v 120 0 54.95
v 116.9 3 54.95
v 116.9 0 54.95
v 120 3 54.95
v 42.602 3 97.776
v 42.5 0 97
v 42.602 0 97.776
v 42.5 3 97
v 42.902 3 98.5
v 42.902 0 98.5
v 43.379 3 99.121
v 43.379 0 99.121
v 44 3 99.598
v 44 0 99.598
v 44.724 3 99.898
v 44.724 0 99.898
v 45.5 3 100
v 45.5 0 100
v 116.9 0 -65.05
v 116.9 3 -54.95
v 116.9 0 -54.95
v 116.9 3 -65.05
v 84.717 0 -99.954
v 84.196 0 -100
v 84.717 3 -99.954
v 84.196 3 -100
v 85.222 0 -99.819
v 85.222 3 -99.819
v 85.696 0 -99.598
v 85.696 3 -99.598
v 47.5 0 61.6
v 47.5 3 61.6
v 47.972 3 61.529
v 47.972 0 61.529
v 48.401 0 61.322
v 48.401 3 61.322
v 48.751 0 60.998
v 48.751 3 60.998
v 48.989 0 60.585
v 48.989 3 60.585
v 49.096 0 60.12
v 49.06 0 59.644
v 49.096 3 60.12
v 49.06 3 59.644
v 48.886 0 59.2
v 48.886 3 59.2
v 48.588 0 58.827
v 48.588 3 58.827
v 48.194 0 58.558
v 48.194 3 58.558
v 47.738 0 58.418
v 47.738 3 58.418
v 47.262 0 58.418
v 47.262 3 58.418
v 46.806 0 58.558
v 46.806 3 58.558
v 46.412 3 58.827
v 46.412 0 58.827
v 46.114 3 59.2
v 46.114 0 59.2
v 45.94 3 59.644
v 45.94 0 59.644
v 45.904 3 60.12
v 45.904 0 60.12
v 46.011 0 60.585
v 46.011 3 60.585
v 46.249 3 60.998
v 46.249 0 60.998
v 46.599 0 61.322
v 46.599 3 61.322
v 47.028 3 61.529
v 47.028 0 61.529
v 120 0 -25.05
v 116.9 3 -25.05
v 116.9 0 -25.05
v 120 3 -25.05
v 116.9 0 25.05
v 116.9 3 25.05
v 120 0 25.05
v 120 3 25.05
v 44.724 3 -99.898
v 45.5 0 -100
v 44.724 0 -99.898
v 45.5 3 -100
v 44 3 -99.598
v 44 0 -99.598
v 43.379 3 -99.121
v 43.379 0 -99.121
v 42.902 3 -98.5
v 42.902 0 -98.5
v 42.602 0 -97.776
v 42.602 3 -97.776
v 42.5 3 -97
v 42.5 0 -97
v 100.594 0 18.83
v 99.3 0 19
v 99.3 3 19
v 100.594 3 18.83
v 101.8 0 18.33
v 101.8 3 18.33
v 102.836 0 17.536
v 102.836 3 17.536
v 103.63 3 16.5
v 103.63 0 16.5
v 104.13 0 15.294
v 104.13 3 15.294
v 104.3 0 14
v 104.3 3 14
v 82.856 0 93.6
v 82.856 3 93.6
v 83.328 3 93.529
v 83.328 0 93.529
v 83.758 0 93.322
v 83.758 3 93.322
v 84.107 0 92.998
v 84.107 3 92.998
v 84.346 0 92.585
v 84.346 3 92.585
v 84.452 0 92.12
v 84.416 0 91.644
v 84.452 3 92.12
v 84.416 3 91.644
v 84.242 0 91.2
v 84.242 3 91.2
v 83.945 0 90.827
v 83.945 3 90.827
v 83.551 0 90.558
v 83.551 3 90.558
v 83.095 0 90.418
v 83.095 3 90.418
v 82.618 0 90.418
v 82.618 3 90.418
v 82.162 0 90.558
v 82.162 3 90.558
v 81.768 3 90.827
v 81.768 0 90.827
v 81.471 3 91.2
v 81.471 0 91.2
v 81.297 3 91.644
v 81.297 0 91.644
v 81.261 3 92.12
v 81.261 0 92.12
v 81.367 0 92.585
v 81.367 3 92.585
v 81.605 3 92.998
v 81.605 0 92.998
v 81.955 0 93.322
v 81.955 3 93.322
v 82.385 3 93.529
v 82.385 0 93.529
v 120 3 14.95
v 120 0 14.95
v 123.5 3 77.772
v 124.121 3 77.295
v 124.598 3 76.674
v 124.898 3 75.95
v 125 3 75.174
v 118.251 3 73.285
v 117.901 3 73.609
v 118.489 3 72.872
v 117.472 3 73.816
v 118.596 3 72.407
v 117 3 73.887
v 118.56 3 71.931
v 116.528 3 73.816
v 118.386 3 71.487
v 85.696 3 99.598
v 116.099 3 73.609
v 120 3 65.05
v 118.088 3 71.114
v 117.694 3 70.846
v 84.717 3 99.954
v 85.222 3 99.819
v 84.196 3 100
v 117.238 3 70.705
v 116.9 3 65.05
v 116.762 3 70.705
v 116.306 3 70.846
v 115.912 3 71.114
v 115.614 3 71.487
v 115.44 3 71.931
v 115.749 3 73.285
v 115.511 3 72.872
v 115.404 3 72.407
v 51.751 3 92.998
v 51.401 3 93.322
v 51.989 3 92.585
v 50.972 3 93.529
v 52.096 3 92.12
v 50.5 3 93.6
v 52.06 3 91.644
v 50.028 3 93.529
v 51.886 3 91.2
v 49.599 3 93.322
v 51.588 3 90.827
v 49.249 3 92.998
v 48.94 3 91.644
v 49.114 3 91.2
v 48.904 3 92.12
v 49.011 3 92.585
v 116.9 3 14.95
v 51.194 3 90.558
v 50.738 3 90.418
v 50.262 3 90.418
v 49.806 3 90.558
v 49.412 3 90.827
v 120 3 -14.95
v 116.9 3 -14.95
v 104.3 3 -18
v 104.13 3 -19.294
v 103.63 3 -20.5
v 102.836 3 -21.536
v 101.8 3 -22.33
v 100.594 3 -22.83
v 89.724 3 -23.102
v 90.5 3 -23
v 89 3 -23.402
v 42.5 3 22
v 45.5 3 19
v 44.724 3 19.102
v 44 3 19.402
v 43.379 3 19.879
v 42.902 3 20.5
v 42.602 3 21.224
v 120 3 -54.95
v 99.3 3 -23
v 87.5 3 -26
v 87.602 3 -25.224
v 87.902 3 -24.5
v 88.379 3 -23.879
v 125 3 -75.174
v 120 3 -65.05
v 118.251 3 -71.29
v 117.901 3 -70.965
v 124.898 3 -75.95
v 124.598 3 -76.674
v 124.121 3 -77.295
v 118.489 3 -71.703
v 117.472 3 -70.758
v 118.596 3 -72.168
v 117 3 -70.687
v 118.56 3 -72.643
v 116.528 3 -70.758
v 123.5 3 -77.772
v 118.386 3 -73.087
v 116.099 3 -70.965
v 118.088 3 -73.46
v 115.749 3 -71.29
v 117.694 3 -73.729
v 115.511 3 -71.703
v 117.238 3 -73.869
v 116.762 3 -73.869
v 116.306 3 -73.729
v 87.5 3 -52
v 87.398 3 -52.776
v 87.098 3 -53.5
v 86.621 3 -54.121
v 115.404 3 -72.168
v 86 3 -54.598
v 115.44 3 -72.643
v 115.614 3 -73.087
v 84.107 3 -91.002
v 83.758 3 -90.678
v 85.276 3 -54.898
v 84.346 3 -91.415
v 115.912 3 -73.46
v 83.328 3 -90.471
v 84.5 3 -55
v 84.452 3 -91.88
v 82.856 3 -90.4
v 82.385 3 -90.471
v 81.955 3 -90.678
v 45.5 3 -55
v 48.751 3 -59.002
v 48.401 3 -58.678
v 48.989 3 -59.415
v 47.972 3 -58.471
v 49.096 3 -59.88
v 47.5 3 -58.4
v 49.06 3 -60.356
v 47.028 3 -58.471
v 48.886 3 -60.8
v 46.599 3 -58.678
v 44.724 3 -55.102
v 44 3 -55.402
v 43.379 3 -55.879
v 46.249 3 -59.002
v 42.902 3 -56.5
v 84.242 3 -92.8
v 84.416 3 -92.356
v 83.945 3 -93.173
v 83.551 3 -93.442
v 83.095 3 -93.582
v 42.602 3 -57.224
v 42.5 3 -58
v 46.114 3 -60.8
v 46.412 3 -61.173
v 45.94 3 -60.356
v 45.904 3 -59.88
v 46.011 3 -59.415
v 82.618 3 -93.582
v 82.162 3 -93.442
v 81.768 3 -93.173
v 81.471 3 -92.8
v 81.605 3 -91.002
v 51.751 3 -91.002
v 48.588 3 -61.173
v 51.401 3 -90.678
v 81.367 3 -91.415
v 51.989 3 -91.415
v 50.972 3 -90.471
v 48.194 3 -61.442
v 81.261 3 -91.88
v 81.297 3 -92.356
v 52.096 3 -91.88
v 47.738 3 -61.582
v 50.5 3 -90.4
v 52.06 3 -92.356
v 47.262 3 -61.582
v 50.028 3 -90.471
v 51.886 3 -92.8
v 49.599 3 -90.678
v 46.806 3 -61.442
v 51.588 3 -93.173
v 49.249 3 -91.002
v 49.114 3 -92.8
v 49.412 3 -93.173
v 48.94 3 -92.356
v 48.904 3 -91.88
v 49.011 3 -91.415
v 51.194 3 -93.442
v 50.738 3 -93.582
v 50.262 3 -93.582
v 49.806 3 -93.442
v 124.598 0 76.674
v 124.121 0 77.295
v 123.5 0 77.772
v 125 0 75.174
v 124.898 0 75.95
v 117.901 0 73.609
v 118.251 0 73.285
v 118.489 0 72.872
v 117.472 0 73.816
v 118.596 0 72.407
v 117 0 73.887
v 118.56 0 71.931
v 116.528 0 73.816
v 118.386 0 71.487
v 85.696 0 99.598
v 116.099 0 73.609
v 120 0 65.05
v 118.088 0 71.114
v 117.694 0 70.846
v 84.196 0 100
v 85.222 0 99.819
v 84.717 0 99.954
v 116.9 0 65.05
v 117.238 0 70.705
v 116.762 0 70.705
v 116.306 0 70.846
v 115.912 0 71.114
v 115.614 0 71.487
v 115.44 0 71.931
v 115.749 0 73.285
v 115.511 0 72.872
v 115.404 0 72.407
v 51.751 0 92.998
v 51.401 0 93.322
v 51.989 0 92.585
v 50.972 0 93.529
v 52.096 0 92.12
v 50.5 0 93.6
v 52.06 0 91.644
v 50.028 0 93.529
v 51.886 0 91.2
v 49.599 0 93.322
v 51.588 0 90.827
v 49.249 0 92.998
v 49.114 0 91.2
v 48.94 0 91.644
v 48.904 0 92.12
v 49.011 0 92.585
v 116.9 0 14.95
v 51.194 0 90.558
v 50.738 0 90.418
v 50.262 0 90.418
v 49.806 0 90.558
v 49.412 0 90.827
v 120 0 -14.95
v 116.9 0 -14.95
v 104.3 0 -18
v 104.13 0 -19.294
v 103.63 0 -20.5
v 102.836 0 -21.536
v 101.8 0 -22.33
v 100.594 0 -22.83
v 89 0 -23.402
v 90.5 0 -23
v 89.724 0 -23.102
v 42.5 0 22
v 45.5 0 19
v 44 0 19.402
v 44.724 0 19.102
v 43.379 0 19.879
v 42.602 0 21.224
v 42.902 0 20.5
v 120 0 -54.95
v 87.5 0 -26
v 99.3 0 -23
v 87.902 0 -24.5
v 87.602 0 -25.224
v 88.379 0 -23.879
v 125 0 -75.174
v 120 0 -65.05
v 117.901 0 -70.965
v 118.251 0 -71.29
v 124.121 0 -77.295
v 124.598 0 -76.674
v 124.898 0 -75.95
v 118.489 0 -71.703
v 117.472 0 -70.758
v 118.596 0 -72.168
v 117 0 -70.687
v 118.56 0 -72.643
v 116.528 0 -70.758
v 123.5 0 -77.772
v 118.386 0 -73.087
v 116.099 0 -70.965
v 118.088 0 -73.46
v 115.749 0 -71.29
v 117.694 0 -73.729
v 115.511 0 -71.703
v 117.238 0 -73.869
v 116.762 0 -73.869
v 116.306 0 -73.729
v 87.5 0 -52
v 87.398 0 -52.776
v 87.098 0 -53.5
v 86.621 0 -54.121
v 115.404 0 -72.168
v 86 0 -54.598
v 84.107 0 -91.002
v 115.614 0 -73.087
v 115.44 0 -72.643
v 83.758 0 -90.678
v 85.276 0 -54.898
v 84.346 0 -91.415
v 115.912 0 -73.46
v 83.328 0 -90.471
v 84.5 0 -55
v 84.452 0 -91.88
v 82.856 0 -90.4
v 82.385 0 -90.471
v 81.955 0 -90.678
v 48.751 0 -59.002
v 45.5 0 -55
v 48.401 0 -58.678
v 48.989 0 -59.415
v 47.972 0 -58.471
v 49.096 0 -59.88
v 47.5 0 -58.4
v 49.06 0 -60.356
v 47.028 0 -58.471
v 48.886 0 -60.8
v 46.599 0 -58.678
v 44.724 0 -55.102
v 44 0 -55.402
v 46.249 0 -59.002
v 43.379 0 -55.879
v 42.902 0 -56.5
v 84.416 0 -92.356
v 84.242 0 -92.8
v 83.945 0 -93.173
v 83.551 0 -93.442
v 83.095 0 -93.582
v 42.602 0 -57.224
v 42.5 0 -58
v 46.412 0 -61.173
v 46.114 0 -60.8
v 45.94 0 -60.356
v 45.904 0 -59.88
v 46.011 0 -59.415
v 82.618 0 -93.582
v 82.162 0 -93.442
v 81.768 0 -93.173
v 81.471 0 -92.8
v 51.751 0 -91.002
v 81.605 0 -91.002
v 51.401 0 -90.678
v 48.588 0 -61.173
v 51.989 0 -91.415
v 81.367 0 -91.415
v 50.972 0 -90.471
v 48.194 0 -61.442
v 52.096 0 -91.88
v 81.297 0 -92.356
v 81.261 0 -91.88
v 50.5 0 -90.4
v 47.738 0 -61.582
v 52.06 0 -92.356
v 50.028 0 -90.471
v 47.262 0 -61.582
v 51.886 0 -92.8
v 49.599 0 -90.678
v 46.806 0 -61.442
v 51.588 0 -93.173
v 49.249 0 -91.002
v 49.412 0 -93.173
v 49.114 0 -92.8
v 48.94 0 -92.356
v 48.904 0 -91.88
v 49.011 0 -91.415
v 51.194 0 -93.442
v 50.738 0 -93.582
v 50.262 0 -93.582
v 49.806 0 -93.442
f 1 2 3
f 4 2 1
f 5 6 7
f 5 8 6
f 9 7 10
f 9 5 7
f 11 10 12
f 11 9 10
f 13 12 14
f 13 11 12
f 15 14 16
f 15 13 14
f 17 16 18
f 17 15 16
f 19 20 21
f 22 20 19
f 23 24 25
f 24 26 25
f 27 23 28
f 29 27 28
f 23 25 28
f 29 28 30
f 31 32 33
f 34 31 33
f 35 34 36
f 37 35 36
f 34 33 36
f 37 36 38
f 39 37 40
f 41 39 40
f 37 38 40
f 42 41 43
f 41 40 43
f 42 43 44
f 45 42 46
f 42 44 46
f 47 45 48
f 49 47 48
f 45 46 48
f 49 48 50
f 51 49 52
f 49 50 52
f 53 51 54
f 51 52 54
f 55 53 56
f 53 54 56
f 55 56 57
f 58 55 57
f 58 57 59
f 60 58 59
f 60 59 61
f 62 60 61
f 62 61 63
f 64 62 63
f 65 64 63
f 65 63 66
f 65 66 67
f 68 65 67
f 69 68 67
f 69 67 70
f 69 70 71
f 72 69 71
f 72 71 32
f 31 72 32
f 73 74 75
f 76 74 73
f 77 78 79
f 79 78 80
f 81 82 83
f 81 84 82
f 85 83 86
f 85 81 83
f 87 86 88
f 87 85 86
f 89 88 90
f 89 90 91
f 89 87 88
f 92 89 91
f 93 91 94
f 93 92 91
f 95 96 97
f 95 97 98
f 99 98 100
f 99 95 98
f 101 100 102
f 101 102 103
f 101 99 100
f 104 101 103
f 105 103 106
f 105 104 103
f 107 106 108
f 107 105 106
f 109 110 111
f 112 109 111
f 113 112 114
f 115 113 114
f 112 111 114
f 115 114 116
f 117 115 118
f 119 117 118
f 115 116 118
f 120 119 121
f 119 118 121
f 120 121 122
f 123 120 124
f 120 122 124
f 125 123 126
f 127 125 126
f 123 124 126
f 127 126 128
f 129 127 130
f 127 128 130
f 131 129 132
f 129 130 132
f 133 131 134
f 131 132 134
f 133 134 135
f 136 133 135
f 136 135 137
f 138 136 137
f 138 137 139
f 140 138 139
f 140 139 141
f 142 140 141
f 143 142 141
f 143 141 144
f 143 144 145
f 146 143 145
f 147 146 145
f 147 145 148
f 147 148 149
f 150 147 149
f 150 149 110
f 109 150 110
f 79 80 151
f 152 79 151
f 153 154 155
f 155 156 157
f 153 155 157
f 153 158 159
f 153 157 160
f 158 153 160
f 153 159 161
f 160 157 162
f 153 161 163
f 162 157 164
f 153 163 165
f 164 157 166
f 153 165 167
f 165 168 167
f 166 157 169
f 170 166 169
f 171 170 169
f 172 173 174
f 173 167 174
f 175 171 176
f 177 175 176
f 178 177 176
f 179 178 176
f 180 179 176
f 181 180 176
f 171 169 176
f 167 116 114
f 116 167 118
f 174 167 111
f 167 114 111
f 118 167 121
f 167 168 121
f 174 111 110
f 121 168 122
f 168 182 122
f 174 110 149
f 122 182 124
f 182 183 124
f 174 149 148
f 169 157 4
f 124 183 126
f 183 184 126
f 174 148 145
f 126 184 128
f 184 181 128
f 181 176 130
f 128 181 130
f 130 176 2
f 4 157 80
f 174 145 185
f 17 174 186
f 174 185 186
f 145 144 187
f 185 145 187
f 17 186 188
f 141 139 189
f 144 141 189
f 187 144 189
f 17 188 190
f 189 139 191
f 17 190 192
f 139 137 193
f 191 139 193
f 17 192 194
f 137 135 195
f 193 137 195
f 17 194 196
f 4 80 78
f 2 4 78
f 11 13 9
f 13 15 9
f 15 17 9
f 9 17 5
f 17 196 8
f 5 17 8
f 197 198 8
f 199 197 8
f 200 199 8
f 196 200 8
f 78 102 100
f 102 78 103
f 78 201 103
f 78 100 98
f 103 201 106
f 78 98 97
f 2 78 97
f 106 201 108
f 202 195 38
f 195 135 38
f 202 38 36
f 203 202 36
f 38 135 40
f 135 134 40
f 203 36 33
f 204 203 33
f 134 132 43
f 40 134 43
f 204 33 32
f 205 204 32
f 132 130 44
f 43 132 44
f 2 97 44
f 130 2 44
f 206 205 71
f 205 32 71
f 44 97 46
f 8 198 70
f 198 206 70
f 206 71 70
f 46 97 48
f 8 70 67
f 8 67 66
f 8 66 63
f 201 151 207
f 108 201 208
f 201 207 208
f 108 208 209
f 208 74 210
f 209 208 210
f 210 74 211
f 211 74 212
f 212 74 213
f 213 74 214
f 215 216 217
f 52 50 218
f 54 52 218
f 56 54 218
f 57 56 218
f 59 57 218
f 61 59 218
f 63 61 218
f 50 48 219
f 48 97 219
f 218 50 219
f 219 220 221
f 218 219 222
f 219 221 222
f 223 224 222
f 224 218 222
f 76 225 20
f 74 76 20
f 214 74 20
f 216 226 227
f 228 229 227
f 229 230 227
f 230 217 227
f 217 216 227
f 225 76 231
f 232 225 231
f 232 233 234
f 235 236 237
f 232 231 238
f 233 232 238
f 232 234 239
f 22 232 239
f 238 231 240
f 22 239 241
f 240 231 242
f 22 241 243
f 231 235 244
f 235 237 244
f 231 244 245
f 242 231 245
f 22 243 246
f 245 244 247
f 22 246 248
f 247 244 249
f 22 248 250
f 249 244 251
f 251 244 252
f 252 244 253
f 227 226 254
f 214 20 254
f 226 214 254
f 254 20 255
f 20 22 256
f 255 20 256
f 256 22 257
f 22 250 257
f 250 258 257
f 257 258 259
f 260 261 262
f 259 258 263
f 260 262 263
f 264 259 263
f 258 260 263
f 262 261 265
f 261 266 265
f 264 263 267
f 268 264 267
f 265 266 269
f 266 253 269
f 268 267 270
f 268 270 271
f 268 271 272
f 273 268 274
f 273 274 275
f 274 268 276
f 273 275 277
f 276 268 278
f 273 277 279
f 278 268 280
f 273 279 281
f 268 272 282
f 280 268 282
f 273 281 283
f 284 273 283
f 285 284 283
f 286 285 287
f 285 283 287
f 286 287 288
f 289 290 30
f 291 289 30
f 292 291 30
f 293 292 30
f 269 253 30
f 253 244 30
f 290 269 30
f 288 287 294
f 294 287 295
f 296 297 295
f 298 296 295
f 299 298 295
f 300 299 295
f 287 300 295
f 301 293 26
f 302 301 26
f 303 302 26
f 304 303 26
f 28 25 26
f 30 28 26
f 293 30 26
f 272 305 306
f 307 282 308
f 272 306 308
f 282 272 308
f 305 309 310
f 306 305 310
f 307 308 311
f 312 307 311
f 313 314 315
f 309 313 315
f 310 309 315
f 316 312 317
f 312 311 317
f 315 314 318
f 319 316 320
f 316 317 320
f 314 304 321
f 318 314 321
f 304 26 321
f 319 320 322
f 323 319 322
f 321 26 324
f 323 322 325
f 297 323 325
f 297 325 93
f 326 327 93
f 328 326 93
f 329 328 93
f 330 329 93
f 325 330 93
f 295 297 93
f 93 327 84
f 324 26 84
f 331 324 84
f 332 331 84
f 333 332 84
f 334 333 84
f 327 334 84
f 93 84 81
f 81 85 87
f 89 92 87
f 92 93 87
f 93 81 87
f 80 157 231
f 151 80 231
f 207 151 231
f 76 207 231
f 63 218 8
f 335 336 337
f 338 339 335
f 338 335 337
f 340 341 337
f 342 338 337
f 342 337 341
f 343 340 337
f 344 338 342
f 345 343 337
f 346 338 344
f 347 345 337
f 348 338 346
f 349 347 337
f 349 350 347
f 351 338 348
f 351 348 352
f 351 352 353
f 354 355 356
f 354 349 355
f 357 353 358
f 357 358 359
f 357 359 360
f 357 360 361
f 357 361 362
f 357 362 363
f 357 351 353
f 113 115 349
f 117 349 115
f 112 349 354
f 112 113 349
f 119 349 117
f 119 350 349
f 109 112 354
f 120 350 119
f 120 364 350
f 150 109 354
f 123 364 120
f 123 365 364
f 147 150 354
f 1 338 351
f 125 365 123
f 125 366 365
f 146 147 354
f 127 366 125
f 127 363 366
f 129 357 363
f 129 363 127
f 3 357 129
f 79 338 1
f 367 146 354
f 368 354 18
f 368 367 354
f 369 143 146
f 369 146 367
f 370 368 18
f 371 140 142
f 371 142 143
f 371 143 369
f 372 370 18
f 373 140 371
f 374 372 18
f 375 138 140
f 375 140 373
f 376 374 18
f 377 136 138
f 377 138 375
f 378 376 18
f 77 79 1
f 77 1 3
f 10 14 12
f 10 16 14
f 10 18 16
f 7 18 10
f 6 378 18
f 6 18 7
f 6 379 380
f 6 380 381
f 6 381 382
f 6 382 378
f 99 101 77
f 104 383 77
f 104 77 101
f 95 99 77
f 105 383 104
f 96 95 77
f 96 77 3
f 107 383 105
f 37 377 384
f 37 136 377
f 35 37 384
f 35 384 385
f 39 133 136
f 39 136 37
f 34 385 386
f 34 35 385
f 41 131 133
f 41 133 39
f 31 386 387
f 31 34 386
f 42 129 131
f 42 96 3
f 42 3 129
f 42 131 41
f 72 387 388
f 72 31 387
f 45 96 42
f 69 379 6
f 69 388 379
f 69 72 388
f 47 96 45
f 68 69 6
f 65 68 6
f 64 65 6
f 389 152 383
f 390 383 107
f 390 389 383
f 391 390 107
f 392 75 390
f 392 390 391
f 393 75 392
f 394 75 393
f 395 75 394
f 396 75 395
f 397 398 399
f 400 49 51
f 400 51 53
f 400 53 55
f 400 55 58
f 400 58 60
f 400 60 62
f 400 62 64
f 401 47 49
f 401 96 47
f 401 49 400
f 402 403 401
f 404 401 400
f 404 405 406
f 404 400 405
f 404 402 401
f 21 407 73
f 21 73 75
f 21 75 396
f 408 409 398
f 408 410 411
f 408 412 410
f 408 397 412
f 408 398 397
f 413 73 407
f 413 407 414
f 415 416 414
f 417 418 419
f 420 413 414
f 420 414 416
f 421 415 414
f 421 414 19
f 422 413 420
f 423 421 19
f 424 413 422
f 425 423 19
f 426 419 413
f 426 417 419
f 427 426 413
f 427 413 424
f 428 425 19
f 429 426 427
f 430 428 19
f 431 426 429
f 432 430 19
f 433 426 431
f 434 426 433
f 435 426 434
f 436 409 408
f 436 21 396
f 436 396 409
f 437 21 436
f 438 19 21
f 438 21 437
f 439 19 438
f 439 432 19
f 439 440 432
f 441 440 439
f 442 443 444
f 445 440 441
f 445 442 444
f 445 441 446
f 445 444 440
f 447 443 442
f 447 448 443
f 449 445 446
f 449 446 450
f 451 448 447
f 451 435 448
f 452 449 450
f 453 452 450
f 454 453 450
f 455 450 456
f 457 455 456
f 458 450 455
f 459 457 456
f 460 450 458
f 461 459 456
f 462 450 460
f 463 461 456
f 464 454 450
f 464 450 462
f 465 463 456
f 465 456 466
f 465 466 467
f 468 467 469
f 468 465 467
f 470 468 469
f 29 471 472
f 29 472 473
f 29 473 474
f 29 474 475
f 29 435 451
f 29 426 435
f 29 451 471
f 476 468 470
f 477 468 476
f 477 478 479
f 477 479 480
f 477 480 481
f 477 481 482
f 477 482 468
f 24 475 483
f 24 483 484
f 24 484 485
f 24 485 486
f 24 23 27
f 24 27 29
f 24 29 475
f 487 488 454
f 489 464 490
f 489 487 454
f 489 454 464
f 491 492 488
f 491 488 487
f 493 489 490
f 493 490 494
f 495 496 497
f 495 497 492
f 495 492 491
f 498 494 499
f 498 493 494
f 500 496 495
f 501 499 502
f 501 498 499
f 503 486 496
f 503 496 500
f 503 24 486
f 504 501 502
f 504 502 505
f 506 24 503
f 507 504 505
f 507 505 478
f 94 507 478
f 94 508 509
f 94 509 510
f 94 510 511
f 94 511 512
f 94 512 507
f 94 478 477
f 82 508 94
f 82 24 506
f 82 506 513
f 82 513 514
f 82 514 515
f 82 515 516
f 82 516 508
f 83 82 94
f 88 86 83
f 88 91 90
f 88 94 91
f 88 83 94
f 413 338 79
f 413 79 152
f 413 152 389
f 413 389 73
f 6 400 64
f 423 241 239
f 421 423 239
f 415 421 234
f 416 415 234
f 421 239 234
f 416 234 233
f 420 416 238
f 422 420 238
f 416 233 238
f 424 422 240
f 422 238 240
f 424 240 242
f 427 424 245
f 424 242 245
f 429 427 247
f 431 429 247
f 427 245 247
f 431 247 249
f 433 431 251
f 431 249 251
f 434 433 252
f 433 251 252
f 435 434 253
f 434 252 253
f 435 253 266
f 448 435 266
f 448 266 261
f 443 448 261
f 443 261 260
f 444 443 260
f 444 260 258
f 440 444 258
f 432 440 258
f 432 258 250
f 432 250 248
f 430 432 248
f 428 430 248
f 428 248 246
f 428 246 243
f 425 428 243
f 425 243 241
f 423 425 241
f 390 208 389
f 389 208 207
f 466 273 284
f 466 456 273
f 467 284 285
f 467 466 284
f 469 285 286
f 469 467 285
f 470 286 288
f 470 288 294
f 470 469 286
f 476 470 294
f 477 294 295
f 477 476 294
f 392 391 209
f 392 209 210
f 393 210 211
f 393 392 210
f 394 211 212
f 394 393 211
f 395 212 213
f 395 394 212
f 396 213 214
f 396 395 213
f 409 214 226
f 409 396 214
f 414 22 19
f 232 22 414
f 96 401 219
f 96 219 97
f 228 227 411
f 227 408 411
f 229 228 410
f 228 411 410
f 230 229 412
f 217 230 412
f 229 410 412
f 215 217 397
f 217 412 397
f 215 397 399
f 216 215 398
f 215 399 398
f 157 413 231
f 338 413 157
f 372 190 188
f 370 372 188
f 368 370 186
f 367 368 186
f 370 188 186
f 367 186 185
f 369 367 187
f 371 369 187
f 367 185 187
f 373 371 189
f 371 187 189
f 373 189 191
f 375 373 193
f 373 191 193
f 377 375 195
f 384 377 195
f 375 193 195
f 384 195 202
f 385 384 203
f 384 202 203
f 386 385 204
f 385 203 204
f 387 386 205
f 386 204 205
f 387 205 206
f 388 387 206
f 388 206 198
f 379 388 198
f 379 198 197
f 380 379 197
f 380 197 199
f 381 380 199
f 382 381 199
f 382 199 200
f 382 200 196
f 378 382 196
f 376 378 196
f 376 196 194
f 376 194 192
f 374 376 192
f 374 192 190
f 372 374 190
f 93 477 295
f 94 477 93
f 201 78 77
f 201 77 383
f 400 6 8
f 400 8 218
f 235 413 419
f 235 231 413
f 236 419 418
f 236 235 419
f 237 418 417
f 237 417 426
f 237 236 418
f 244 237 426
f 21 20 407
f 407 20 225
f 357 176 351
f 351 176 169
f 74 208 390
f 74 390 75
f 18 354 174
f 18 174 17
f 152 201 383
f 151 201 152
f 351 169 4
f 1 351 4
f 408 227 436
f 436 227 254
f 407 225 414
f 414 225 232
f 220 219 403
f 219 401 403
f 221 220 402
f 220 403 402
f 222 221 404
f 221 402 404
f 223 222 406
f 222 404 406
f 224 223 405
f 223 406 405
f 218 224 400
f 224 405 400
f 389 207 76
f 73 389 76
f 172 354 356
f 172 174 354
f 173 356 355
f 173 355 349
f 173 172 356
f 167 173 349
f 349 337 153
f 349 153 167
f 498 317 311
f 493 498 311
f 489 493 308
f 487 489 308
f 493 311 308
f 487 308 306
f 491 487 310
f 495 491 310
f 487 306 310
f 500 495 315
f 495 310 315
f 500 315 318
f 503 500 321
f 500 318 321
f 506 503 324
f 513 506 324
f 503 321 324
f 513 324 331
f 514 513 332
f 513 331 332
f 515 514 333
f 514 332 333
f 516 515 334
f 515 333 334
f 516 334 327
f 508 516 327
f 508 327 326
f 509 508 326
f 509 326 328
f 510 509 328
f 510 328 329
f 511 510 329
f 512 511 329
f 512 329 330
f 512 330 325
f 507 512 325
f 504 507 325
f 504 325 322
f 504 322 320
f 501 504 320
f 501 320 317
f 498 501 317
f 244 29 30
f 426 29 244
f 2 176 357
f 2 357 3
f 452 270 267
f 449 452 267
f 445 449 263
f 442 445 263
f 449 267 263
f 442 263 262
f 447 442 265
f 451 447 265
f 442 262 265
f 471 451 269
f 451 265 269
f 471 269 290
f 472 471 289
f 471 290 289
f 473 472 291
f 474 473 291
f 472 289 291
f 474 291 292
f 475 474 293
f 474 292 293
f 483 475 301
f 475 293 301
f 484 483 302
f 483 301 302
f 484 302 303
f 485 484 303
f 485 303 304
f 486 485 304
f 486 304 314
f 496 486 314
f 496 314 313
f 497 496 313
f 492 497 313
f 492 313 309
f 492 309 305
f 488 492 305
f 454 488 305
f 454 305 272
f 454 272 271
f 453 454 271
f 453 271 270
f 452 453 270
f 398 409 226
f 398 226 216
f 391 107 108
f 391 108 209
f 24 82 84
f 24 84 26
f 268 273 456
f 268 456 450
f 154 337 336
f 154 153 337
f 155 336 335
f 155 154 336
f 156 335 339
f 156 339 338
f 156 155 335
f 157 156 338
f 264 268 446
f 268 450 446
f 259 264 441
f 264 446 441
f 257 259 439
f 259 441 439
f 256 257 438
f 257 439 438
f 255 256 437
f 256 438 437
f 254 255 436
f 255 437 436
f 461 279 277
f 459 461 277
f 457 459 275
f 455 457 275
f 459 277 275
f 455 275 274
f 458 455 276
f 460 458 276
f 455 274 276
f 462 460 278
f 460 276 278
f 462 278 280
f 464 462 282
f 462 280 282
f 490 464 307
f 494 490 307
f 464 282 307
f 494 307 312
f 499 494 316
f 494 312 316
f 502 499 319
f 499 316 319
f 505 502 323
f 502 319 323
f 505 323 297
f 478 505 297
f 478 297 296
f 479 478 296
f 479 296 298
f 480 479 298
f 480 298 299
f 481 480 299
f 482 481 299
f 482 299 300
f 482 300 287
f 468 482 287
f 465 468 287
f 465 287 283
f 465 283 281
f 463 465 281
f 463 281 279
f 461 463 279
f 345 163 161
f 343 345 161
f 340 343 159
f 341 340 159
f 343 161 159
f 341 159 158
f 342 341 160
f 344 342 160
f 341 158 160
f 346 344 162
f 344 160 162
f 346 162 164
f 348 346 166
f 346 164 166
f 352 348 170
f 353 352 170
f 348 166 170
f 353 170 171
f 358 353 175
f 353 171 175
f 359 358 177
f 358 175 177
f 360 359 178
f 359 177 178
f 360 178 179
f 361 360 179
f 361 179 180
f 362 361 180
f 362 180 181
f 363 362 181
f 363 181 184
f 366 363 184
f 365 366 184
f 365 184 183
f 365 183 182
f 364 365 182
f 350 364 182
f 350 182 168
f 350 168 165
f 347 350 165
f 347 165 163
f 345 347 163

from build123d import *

# Parameters (mm, degrees)
BOSS_EXTRUDE1_DEPTH = 3
CUT_EXTRUDE1_REACH  = 162.106
SKETCH2_W           = 45
SKETCH2_H           = 74
FILLET2_R           = 3
SKETCH3_W           = 3.1
SKETCH3_H           = 10.1
CUT_EXTRUDE2_DEPTH  = 161.106214745
CUT_EXTRUDE3_REACH  = 162.106
SKETCH4_R           = 1.6


with BuildPart() as part:
    # Sketch1 → Boss-Extrude1 (new body)
    with BuildSketch(Plane(origin=(0, 0, 0), x_dir=(1, 0, 0), z_dir=(0, 1, 0))):
        Polygon((42.5, 100), (85, 100), (125, 76.905989232), (125, -76.905989232), (85, -100), (42.5, -100), align=None)
        with BuildLine():
            Line((99.3, 23), (67.3, 23))
            ThreePointArc((67.3, 23), (63.764466094, 21.535533906), (62.3, 18))
            Line((62.3, 18), (62.3, -14))
            ThreePointArc((62.3, -14), (63.764466094, -17.535533906), (67.3, -19))
            Line((67.3, -19), (99.3, -19))
            ThreePointArc((99.3, -19), (102.835533906, -17.535533906), (104.3, -14))
            Line((104.3, -14), (104.3, 18))
            ThreePointArc((104.3, 18), (102.835533906, 21.535533906), (99.3, 23))
        make_face(mode=Mode.SUBTRACT)
    extrude(amount=BOSS_EXTRUDE1_DEPTH)

    # Sketch2 → Cut-Extrude1 (cut, up to next)
    with BuildSketch(Plane(origin=(0, 3, 0), x_dir=(1, 0, 0), z_dir=(0, 1, 0)), mode=Mode.PRIVATE) as cut_extrude1_sk1:
        with Locations((65, 18)):
            Rectangle(SKETCH2_W, SKETCH2_H)
    cut_extrude1_tool1 = extrude(cut_extrude1_sk1.sketch, amount=-CUT_EXTRUDE1_REACH, mode=Mode.PRIVATE) & part.part
    add(cut_extrude1_tool1.solids().sort_by_distance((65, 3, -18))[0], mode=Mode.SUBTRACT)

    # Fillet2
    fillet2_edges = [part.edges().sort_by_distance(p)[0] for p in [
        (125, 1.5, -76.905989232),
        (125, 1.5, 76.905989232),
        (85, 1.5, 100),
        (42.5, 1.5, 100),
        (42.5, 1.5, -100),
        (85, 1.5, -100),
        (42.5, 1.5, 19),
        (42.5, 1.5, -55),
        (87.5, 1.5, -23),
        (87.5, 1.5, -55),
    ]]
    fillet(fillet2_edges, radius=FILLET2_R)

    # Sketch3 → Cut-Extrude2 (cut, through all)
    with BuildSketch(Plane(origin=(0, 3, 0), x_dir=(1, 0, 0), z_dir=(0, 1, 0))):
        with Locations((118.45, 20)):
            Rectangle(SKETCH3_W, SKETCH3_H)
        with Locations((118.45, -20)):
            Rectangle(SKETCH3_W, SKETCH3_H)
        with Locations((118.45, 60)):
            Rectangle(SKETCH3_W, SKETCH3_H)
        with Locations((118.45, -60)):
            Rectangle(SKETCH3_W, SKETCH3_H)
    extrude(amount=-CUT_EXTRUDE2_DEPTH, mode=Mode.SUBTRACT)

    # Sketch4 → Cut-Extrude3 (cut, up to next)
    with BuildSketch(Plane(origin=(0, 3, 0), x_dir=(1, 0, 0), z_dir=(0, 1, 0)), mode=Mode.PRIVATE) as cut_extrude3_sk1:
        with Locations(Location((50.5, 92, 0), (0, 0, 270))):
            Circle(SKETCH4_R)
    cut_extrude3_tool1 = extrude(cut_extrude3_sk1.sketch, amount=-CUT_EXTRUDE3_REACH, mode=Mode.PRIVATE) & part.part
    # Sketch4 → Cut-Extrude3 (cut, up to next)
    with BuildSketch(Plane(origin=(0, 3, 0), x_dir=(1, 0, 0), z_dir=(0, 1, 0)), mode=Mode.PRIVATE) as cut_extrude3_sk2:
        with Locations(Location((47.5, 60, 0), (0, 0, 270))):
            Circle(SKETCH4_R)
    cut_extrude3_tool2 = extrude(cut_extrude3_sk2.sketch, amount=-CUT_EXTRUDE3_REACH, mode=Mode.PRIVATE) & part.part
    # Sketch4 → Cut-Extrude3 (cut, up to next)
    with BuildSketch(Plane(origin=(0, 3, 0), x_dir=(1, 0, 0), z_dir=(0, 1, 0)), mode=Mode.PRIVATE) as cut_extrude3_sk3:
        with Locations(Location((47.5, -60, 0), (0, 0, 270))):
            Circle(SKETCH4_R)
    cut_extrude3_tool3 = extrude(cut_extrude3_sk3.sketch, amount=-CUT_EXTRUDE3_REACH, mode=Mode.PRIVATE) & part.part
    # Sketch4 → Cut-Extrude3 (cut, up to next)
    with BuildSketch(Plane(origin=(0, 3, 0), x_dir=(1, 0, 0), z_dir=(0, 1, 0)), mode=Mode.PRIVATE) as cut_extrude3_sk4:
        with Locations(Location((50.5, -92, 0), (0, 0, 270))):
            Circle(SKETCH4_R)
    cut_extrude3_tool4 = extrude(cut_extrude3_sk4.sketch, amount=-CUT_EXTRUDE3_REACH, mode=Mode.PRIVATE) & part.part
    # Sketch4 → Cut-Extrude3 (cut, up to next)
    with BuildSketch(Plane(origin=(0, 3, 0), x_dir=(1, 0, 0), z_dir=(0, 1, 0)), mode=Mode.PRIVATE) as cut_extrude3_sk5:
        with Locations(Location((117, 72.287187079, 0), (0, 0, 270))):
            Circle(SKETCH4_R)
    cut_extrude3_tool5 = extrude(cut_extrude3_sk5.sketch, amount=-CUT_EXTRUDE3_REACH, mode=Mode.PRIVATE) & part.part
    # Sketch4 → Cut-Extrude3 (cut, up to next)
    with BuildSketch(Plane(origin=(0, 3, 0), x_dir=(1, 0, 0), z_dir=(0, 1, 0)), mode=Mode.PRIVATE) as cut_extrude3_sk6:
        with Locations(Location((117, -72.287187079, 0), (0, 0, 270))):
            Circle(SKETCH4_R)
    cut_extrude3_tool6 = extrude(cut_extrude3_sk6.sketch, amount=-CUT_EXTRUDE3_REACH, mode=Mode.PRIVATE) & part.part
    # Sketch4 → Cut-Extrude3 (cut, up to next)
    with BuildSketch(Plane(origin=(0, 3, 0), x_dir=(1, 0, 0), z_dir=(0, 1, 0)), mode=Mode.PRIVATE) as cut_extrude3_sk7:
        with Locations(Location((82.856406461, 92, 0), (0, 0, 270))):
            Circle(SKETCH4_R)
    cut_extrude3_tool7 = extrude(cut_extrude3_sk7.sketch, amount=-CUT_EXTRUDE3_REACH, mode=Mode.PRIVATE) & part.part
    # Sketch4 → Cut-Extrude3 (cut, up to next)
    with BuildSketch(Plane(origin=(0, 3, 0), x_dir=(1, 0, 0), z_dir=(0, 1, 0)), mode=Mode.PRIVATE) as cut_extrude3_sk8:
        with Locations(Location((82.856406461, -92, 0), (0, 0, 270))):
            Circle(SKETCH4_R)
    cut_extrude3_tool8 = extrude(cut_extrude3_sk8.sketch, amount=-CUT_EXTRUDE3_REACH, mode=Mode.PRIVATE) & part.part
    add(cut_extrude3_tool1.solids().sort_by_distance((50.5, 3, -92))[0], mode=Mode.SUBTRACT)
    add(cut_extrude3_tool2.solids().sort_by_distance((47.5, 3, -60))[0], mode=Mode.SUBTRACT)
    add(cut_extrude3_tool3.solids().sort_by_distance((47.5, 3, 60))[0], mode=Mode.SUBTRACT)
    add(cut_extrude3_tool4.solids().sort_by_distance((50.5, 3, 92))[0], mode=Mode.SUBTRACT)
    add(cut_extrude3_tool5.solids().sort_by_distance((117, 3, -72.287187))[0], mode=Mode.SUBTRACT)
    add(cut_extrude3_tool6.solids().sort_by_distance((117, 3, 72.287187))[0], mode=Mode.SUBTRACT)
    add(cut_extrude3_tool7.solids().sort_by_distance((82.856406, 3, -92))[0], mode=Mode.SUBTRACT)
    add(cut_extrude3_tool8.solids().sort_by_distance((82.856406, 3, 92))[0], mode=Mode.SUBTRACT)


solid = part.part
